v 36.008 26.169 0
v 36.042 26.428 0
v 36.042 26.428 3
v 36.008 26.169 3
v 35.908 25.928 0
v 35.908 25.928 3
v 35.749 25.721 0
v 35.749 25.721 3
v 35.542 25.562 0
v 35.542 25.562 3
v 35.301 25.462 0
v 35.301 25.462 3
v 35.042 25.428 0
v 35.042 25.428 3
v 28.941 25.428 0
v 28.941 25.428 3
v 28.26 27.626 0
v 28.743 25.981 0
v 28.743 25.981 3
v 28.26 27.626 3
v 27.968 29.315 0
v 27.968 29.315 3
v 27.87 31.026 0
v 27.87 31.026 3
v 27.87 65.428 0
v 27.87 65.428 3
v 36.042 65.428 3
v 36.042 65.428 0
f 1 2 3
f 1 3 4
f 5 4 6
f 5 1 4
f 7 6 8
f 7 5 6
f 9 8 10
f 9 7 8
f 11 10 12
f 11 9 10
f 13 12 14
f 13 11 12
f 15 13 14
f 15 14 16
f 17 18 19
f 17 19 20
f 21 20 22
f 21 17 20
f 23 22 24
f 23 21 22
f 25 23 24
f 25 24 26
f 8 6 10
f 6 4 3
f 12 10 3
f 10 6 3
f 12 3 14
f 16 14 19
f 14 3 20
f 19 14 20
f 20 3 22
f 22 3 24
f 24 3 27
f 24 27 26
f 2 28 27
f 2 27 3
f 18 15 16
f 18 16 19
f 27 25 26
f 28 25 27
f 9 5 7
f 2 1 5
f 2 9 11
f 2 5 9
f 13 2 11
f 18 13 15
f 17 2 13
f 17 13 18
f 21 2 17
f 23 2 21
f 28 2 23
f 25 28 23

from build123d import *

# Parameters (mm, degrees)
SALIENTE_EXTRUIR1_DEPTH = 3


with BuildPart() as part:
    # Model → Saliente-Extruir1 (new body)
    with BuildSketch(Plane.XY):
        with BuildLine():
            Line((27.869611368, 31.026206242), (27.869611368, 41.227103121))
            Line((27.869611368, 41.227103121), (27.869611368, 50.428))
            Line((27.869611368, 50.428), (27.869611368, 65.428))
            Line((27.869611368, 65.428), (36.042388632, 65.428))
            Line((36.042388632, 65.428), (36.042388632, 64.428))
            Line((36.042388632, 64.428), (36.042388632, 45.928))
            Line((36.042388632, 45.928), (36.042388632, 26.428))
            ThreePointArc((36.042388632, 26.428), (35.749495414, 25.720893219), (35.042388632, 25.428))
            Line((35.042388632, 25.428), (28.941039939, 25.428))
            Line((28.941039939, 25.428), (28.743482694, 25.981160287))
            ThreePointArc((28.743482694, 25.981160287), (28.089693741, 28.466121293), (27.869611368, 31.026206242))
        make_face()
    extrude(amount=SALIENTE_EXTRUIR1_DEPTH)


solid = part.part
